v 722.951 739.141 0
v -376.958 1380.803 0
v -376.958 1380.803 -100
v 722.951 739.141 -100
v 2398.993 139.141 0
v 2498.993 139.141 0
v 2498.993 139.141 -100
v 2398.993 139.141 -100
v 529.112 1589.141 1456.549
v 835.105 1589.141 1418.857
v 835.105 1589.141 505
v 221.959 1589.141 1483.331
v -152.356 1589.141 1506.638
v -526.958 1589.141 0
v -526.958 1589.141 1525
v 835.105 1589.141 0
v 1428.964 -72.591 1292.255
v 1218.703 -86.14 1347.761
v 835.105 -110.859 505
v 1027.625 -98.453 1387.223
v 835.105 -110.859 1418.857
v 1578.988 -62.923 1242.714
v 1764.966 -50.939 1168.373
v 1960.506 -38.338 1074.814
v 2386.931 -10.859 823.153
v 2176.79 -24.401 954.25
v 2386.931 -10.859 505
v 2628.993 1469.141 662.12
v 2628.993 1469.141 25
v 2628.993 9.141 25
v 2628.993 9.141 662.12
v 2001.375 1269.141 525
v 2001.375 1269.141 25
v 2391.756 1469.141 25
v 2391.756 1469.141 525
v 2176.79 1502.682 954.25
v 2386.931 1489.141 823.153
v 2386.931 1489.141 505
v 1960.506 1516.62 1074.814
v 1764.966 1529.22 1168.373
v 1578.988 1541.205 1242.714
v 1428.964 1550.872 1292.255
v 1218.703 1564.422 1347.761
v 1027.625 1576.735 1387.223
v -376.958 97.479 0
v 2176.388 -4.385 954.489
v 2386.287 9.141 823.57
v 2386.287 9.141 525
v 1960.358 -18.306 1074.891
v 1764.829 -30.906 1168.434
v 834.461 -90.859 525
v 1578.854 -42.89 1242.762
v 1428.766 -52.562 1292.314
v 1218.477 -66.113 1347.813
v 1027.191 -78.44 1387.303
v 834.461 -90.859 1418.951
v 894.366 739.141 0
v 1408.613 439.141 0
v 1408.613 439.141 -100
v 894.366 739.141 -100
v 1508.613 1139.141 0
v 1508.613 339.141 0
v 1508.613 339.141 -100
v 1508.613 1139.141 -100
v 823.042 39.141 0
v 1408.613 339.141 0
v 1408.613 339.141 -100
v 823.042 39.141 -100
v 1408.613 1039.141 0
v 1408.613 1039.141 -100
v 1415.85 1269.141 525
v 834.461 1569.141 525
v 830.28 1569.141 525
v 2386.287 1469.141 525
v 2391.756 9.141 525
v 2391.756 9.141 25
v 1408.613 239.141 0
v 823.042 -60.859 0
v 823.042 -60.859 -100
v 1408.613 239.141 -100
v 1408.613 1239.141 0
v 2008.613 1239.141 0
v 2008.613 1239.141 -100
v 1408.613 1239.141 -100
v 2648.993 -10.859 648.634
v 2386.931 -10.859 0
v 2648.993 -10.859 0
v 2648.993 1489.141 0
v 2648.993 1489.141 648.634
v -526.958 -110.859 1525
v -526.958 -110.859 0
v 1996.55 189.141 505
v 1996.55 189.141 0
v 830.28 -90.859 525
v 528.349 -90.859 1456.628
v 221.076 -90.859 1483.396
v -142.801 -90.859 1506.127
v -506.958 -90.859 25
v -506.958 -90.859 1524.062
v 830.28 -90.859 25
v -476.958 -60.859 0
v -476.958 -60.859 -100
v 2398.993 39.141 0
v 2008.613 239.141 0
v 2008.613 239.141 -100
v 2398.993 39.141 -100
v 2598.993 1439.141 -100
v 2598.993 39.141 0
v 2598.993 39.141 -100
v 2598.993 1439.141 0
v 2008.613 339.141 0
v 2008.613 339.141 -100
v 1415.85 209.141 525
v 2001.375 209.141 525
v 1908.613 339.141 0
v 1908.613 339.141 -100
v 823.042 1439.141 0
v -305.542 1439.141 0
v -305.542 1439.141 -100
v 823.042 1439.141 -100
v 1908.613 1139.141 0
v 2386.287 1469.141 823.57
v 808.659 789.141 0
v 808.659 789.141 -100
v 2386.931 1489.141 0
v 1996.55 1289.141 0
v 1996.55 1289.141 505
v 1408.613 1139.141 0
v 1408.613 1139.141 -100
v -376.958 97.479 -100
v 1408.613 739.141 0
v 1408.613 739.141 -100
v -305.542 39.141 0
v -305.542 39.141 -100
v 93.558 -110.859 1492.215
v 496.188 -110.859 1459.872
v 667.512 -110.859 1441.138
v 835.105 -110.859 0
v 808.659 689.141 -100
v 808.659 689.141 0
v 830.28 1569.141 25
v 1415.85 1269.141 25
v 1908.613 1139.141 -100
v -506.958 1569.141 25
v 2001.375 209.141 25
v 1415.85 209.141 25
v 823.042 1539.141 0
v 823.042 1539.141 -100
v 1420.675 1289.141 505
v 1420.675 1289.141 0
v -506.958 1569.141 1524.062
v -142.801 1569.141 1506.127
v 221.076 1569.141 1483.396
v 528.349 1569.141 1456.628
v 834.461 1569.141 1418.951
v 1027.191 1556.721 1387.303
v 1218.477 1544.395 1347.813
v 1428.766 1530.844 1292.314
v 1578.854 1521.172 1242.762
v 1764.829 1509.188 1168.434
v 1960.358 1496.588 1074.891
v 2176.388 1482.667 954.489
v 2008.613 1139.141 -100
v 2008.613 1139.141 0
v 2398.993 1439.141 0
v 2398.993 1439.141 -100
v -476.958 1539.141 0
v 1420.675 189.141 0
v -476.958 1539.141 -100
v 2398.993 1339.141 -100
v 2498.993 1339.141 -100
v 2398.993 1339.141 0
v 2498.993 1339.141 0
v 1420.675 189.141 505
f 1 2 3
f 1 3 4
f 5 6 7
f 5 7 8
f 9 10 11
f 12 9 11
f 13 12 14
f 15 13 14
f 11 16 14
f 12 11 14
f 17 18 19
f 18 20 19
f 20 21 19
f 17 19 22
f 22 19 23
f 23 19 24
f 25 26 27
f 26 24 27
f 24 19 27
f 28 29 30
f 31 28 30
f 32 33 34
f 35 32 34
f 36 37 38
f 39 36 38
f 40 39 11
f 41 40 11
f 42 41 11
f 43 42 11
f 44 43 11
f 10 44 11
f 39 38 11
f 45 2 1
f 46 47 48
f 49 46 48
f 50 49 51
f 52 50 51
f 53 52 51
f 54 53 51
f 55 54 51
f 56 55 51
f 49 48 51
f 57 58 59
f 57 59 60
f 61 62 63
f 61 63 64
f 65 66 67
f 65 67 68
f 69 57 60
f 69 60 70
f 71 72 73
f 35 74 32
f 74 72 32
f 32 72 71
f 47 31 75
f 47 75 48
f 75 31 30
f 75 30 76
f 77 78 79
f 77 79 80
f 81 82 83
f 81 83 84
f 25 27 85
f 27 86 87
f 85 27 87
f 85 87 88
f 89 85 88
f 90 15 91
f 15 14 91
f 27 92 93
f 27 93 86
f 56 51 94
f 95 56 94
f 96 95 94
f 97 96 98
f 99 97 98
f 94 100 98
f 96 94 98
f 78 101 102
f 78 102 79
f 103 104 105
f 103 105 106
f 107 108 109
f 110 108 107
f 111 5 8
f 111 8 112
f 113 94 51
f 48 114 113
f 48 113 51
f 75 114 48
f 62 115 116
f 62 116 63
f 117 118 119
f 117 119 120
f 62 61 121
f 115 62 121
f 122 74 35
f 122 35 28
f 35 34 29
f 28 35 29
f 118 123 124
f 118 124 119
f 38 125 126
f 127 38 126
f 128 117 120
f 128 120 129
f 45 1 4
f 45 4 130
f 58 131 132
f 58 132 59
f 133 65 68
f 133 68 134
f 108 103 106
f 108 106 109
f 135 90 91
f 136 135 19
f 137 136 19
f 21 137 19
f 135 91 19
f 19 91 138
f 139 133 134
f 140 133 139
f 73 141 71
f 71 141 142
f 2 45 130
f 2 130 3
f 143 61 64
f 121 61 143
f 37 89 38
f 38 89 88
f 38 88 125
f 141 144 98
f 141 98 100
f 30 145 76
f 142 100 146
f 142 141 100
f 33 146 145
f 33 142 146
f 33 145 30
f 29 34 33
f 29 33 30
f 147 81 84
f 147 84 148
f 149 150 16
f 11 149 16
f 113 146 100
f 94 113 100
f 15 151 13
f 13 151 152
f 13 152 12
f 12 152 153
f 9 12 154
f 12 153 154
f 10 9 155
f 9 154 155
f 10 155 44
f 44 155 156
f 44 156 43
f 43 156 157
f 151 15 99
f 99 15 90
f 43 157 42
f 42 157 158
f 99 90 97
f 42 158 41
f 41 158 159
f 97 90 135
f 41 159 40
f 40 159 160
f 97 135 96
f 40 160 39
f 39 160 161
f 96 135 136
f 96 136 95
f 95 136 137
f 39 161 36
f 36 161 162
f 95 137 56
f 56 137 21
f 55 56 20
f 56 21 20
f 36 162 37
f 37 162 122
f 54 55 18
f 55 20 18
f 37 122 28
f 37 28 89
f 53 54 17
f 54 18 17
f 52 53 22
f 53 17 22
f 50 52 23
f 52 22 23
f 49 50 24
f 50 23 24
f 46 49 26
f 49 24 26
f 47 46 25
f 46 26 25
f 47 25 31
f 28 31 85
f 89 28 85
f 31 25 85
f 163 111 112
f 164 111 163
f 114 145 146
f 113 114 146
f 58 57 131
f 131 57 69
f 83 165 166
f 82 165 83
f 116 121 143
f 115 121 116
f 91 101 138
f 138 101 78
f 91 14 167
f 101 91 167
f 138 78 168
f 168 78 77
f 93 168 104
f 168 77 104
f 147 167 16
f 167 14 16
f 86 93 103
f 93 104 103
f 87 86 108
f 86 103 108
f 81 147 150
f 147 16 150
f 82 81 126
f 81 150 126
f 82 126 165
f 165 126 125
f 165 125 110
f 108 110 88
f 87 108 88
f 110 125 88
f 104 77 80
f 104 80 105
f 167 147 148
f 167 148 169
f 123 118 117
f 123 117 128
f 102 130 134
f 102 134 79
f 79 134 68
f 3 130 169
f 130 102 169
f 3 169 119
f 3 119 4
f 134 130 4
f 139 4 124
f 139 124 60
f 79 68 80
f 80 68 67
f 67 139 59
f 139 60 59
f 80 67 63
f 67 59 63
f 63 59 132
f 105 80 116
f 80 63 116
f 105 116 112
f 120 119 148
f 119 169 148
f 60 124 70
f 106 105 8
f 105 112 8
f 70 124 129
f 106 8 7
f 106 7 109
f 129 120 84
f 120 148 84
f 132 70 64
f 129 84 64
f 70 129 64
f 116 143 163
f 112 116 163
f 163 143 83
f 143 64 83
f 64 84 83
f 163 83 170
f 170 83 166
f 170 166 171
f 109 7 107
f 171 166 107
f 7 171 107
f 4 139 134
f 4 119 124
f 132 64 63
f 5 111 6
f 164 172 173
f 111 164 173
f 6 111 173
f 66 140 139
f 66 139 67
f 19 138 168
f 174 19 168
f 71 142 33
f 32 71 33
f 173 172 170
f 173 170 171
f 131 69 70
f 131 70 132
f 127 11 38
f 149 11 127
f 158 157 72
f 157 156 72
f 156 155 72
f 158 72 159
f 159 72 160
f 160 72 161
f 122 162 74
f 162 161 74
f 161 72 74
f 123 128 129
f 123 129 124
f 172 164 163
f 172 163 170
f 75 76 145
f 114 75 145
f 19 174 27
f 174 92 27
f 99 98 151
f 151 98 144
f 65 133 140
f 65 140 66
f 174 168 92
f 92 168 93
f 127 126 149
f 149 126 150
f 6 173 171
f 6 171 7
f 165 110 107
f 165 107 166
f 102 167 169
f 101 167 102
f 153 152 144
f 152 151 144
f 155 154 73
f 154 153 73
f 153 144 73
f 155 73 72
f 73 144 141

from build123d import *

# Parameters (mm, degrees)
F1_DEPTH  = 100
F3_DEPTH  = 25
F5_DEPTH  = 500
F7_DEPTH  = 20
F9_DEPTH  = 1000
F11_DEPTH = 2000


with BuildPart() as f1:
    # F0 (on Top) → F1 (new body)
    with BuildSketch(Plane.XY):
        Polygon((-476.9575450942, 1539.1407966614), (-476.9575450942, 1439.1407966614), (-476.9575450942, 39.1407966614), (-476.9575450942, -60.8592033386), (823.0424549058, -60.8592033386), (1408.6128637736, 239.1407966614), (1708.6128637736, 239.1407966614), (2008.6128637736, 239.1407966614), (2398.9931363521, 39.1407966614), (2598.9931363521, 39.1407966614), (2598.9931363521, 139.1407966614), (2598.9931363521, 739.1407966614), (2598.9931363521, 1339.1407966614), (2598.9931363521, 1439.1407966614), (2398.9931363521, 1439.1407966614), (2008.6128637736, 1239.1407966614), (1708.6128637736, 1239.1407966614), (1408.6128637736, 1239.1407966614), (823.0424549058, 1539.1407966614), align=None)
        Polygon((-376.9575450942, 97.4785810701), (-376.9575450942, 1380.8030122527), (722.9508969124, 739.1407966614), align=None, mode=Mode.SUBTRACT)
        Polygon((823.0424549058, 39.1407966601), (-305.5420533788, 39.1407966612), (808.6586427702, 689.1407966614), (1408.6128637735, 339.1407966614), align=None, mode=Mode.SUBTRACT)
        Polygon((823.0424549058, 1439.1407966614), (1408.6128637735, 1139.1407966615), (808.6586427701, 789.1407966614), (-305.542053379, 1439.1407966614), align=None, mode=Mode.SUBTRACT)
        Polygon((894.3663886278, 739.1407966614), (1408.6128637736, 1039.1407966615), (1408.6128637738, 739.1407966615), (1408.6128637736, 439.1407966614), align=None, mode=Mode.SUBTRACT)
        Polygon((1908.6128637736, 1139.1407966614), (1908.6128637736, 739.1407966614), (1908.6128637736, 339.1407966614), (1708.6128637736, 339.1407966614), (1508.6128637736, 339.1407966614), (1508.6128637736, 739.1407966614), (1508.6128637735, 1139.1407966615), (1708.6128637735, 1139.1407966615), align=None, mode=Mode.SUBTRACT)
        Polygon((2008.6128637736, 339.1407966614), (2008.6128637736, 739.1407966614), (2008.6128637736, 1139.1407966614), (2398.9931363521, 1339.1407966614), (2498.9931363521, 1339.1407966614), (2498.9931363521, 739.1407966614), (2498.9931363521, 139.1407966614), (2398.9931363521, 139.1407966614), align=None, mode=Mode.SUBTRACT)
    extrude(amount=-F1_DEPTH)

    # F2 (on face) → F3 (join)
    with BuildSketch(Plane.XY):
        Polygon((835.1050236414, -110.8592033386), (1420.6754325092, 189.1407966614), (1708.6128637736, 189.1407966614), (1996.550295038, 189.1407966614), (2386.9305676165, -10.8592033386), (2648.9931363521, -10.8592033386), (2648.9931363521, 139.1407966614), (2648.9931363521, 739.1407966614), (2648.9931363521, 1339.1407966614), (2648.9931363521, 1489.1407966614), (2386.9305676165, 1489.1407966614), (1996.550295038, 1289.1407966614), (1708.6128637736, 1289.1407966614), (1420.6754325092, 1289.1407966614), (835.1050236414, 1589.1407966614), (-526.9575450942, 1589.1407966614), (-526.9575450942, 1439.1407966614), (-526.9575450942, 39.1407966614), (-526.9575450942, -110.8592033386), align=None)
        Polygon((-476.9575450942, 1439.1407966614), (-476.9575450942, 1539.1407966614), (823.0424549058, 1539.1407966614), (1408.6128637736, 1239.1407966614), (1708.6128637736, 1239.1407966614), (2008.6128637736, 1239.1407966614), (2398.9931363521, 1439.1407966614), (2598.9931363521, 1439.1407966614), (2598.9931363521, 1339.1407966614), (2598.9931363521, 739.1407966614), (2598.9931363521, 139.1407966614), (2598.9931363521, 39.1407966614), (2398.9931363521, 39.1407966614), (2008.6128637736, 239.1407966614), (1708.6128637736, 239.1407966614), (1408.6128637736, 239.1407966614), (823.0424549058, -60.8592033386), (-476.9575450942, -60.8592033386), (-476.9575450942, 39.1407966614), align=None, mode=Mode.SUBTRACT)
        Polygon((823.0424549058, 1539.1407966614), (-476.9575450942, 1539.1407966614), (-476.9575450942, 1439.1407966614), (-476.9575450942, 39.1407966614), (-476.9575450942, -60.8592033386), (823.0424549058, -60.8592033386), (1408.6128637736, 239.1407966614), (1708.6128637736, 239.1407966614), (2008.6128637736, 239.1407966614), (2398.9931363521, 39.1407966614), (2598.9931363521, 39.1407966614), (2598.9931363521, 139.1407966614), (2598.9931363521, 739.1407966614), (2598.9931363521, 1339.1407966614), (2598.9931363521, 1439.1407966614), (2398.9931363521, 1439.1407966614), (2008.6128637736, 1239.1407966614), (1708.6128637736, 1239.1407966614), (1408.6128637736, 1239.1407966614), align=None)
        Polygon((722.9508969124, 739.1407966614), (-376.9575450942, 97.4785810701), (-376.9575450942, 1380.8030122527), align=None, mode=Mode.SUBTRACT)
        Polygon((1408.6128637735, 339.1407966614), (823.0424549058, 39.1407966601), (-305.5420533788, 39.1407966612), (808.6586427702, 689.1407966614), align=None, mode=Mode.SUBTRACT)
        Polygon((-305.542053379, 1439.1407966614), (823.0424549058, 1439.1407966614), (1408.6128637735, 1139.1407966615), (808.6586427701, 789.1407966614), align=None, mode=Mode.SUBTRACT)
        Polygon((1408.6128637736, 439.1407966614), (894.3663886278, 739.1407966614), (1408.6128637736, 1039.1407966615), (1408.6128637738, 739.1407966615), align=None, mode=Mode.SUBTRACT)
        Polygon((1708.6128637736, 1139.1407966614), (1908.6128637736, 1139.1407966614), (1908.6128637736, 739.1407966614), (1908.6128637736, 339.1407966614), (1708.6128637736, 339.1407966614), (1508.6128637736, 339.1407966614), (1508.6128637736, 739.1407966614), (1508.6128637735, 1139.1407966615), align=None, mode=Mode.SUBTRACT)
        Polygon((2008.6128637736, 339.1407966614), (2008.6128637736, 739.1407966614), (2008.6128637736, 1139.1407966614), (2398.9931363521, 1339.1407966614), (2498.9931363521, 1339.1407966614), (2498.9931363521, 739.1407966614), (2498.9931363521, 139.1407966614), (2398.9931363521, 139.1407966614), align=None, mode=Mode.SUBTRACT)
        Polygon((1908.6128637736, 739.1407966614), (1908.6128637736, 1139.1407966614), (1708.6128637736, 1139.1407966614), (1508.6128637735, 1139.1407966615), (1508.6128637735, 739.1407966615), (1508.6128637736, 339.1407966614), (1708.6128637735, 339.1407966614), (1908.6128637736, 339.1407966614), align=None)
        Polygon((1408.6128637736, 1039.1407966615), (894.3663886278, 739.1407966614), (1408.6128637736, 439.1407966614), (1408.6128637736, 739.1407966614), align=None)
        Polygon((-305.5420533788, 39.1407966612), (823.0424549058, 39.1407966601), (1408.6128637735, 339.1407966614), (808.6586427702, 689.1407966614), align=None)
        Polygon((1408.6128637735, 1139.1407966615), (823.0424549058, 1439.1407966614), (-305.542053379, 1439.1407966614), (808.6586427701, 789.1407966614), align=None)
        Polygon((-376.9575450942, 1380.8030122527), (-376.9575450942, 97.4785810701), (722.9508969124, 739.1407966614), align=None)
        Polygon((2008.6128637736, 1139.1407966614), (2008.6128637736, 739.1407966614), (2008.6128637736, 339.1407966614), (2398.9931363521, 139.1407966614), (2498.9931363521, 139.1407966614), (2498.9931363521, 739.1407966614), (2498.9931363521, 1339.1407966614), (2398.9931363521, 1339.1407966614), align=None)
    extrude(amount=F3_DEPTH)

    # F4 (on face) → F5 (join)
    with BuildSketch(Plane.XY.offset(25)):
        Polygon((-526.9575450942, 1589.1407966614), (-526.9575450942, -110.8592033386), (835.1050236414, -110.8592033386), (1420.6754325092, 189.1407966614), (1996.550295038, 189.1407966614), (2386.9305676165, -10.8592033386), (2648.9931363521, -10.8592033386), (2648.9931363521, 1489.1407966614), (2386.9305676165, 1489.1407966614), (1996.550295038, 1289.1407966614), (1420.6754325092, 1289.1407966614), (835.1050236414, 1589.1407966614), align=None)
        Polygon((2628.9931363521, 9.1407966614), (2391.7555951107, 9.1407966614), (2001.3753225322, 209.1407966614), (1415.850405015, 209.1407966614), (830.2799961471, -90.8592033386), (-506.9575450942, -90.8592033386), (-506.9575450942, 1569.1407966614), (830.2799961471, 1569.1407966614), (1415.8504050149, 1269.1407966614), (2001.3753225322, 1269.1407966614), (2391.7555951107, 1469.1407966614), (2628.9931363521, 1469.1407966614), align=None, mode=Mode.SUBTRACT)
    extrude(amount=F5_DEPTH)

    # F6 (on face) → F7 (join)
    with BuildSketch(Plane.XY.offset(525)):
        Polygon((1420.6754325092, 189.1407966614), (835.1050236414, -110.8592033386), (2386.9305676165, -10.8592033386), (1996.550295038, 189.1407966614), align=None)
        Polygon((2386.9305676165, 1489.1407966614), (835.1050236414, 1589.1407966614), (1420.6754325092, 1289.1407966614), (1996.550295038, 1289.1407966614), align=None)
    extrude(amount=-F7_DEPTH)

    # F8 (on face) → F9 (join)
    with BuildSketch(Plane.XY.offset(525)):
        Polygon((2386.9305676165, 1489.1407966614), (835.1050236414, 1589.1407966614), (-526.9575450942, 1589.1407966614), (-526.9575450942, -110.8592033386), (835.1050236414, -110.8592033386), (2386.9305676165, -10.8592033386), (2648.9931363521, -10.8592033386), (2648.9931363521, 1489.1407966614), align=None)
        Polygon((2391.7555951107, 1469.1407966614), (2628.9931363521, 1469.1407966614), (2628.9931363521, 9.1407966614), (2391.7555951107, 9.1407966614), (2386.2868328759, 9.1407966614), (834.4612889008, -90.8592033386), (830.2799961471, -90.8592033386), (-506.9575450942, -90.8592033386), (-506.9575450942, 1569.1407966614), (830.2799961471, 1569.1407966614), (834.4612889008, 1569.1407966614), (2386.2868328759, 1469.1407966614), align=None, mode=Mode.SUBTRACT)
    extrude(amount=F9_DEPTH)

    # F10 (on face) → F11 (cut)
    with BuildSketch(Plane.XZ.offset(110.8592033386)):
        with BuildLine():
            Line((835.1050236414, 1525), (-526.9575450942, 1525))
            add(Edge.make_bspline(
                [(-526.9575450942, 1525), (-58.7869396097, 1503.0453230908), (409.4284087165, 1481.1639376683), (835.1050236415, 1418.8568069486)],
                knots=[0, 0, 0, 0, 0.3597014322, 0.3597014322, 0.3597014322, 0.3597014322], degree=3))
            Line((835.1050236414, 1418.8568069486), (835.1050236414, 1525))
        make_face()
        with BuildLine():
            Line((835.1050236414, 1525), (835.1050236414, 1418.8568069486))
            add(Edge.make_bspline(
                [(835.1050236415, 1418.8568069486), (1061.8809895187, 1385.6631588726), (1779.2803071525, 1236.4144865114), (2290.0021320838, 890.7024812782), (2648.9931363521, 648.6338376999)],
                knots=[0.3597014322, 0.3597014322, 0.3597014322, 0.3597014322, 0.5513296234, 1, 1, 1, 1], degree=3))
            Line((2648.9931363521, 648.6338376999), (2648.9931363521, 1525))
            Line((2648.9931363521, 1525), (835.1050236414, 1525))
        make_face()
    extrude(amount=-F11_DEPTH, mode=Mode.SUBTRACT)


solid = f1.part
